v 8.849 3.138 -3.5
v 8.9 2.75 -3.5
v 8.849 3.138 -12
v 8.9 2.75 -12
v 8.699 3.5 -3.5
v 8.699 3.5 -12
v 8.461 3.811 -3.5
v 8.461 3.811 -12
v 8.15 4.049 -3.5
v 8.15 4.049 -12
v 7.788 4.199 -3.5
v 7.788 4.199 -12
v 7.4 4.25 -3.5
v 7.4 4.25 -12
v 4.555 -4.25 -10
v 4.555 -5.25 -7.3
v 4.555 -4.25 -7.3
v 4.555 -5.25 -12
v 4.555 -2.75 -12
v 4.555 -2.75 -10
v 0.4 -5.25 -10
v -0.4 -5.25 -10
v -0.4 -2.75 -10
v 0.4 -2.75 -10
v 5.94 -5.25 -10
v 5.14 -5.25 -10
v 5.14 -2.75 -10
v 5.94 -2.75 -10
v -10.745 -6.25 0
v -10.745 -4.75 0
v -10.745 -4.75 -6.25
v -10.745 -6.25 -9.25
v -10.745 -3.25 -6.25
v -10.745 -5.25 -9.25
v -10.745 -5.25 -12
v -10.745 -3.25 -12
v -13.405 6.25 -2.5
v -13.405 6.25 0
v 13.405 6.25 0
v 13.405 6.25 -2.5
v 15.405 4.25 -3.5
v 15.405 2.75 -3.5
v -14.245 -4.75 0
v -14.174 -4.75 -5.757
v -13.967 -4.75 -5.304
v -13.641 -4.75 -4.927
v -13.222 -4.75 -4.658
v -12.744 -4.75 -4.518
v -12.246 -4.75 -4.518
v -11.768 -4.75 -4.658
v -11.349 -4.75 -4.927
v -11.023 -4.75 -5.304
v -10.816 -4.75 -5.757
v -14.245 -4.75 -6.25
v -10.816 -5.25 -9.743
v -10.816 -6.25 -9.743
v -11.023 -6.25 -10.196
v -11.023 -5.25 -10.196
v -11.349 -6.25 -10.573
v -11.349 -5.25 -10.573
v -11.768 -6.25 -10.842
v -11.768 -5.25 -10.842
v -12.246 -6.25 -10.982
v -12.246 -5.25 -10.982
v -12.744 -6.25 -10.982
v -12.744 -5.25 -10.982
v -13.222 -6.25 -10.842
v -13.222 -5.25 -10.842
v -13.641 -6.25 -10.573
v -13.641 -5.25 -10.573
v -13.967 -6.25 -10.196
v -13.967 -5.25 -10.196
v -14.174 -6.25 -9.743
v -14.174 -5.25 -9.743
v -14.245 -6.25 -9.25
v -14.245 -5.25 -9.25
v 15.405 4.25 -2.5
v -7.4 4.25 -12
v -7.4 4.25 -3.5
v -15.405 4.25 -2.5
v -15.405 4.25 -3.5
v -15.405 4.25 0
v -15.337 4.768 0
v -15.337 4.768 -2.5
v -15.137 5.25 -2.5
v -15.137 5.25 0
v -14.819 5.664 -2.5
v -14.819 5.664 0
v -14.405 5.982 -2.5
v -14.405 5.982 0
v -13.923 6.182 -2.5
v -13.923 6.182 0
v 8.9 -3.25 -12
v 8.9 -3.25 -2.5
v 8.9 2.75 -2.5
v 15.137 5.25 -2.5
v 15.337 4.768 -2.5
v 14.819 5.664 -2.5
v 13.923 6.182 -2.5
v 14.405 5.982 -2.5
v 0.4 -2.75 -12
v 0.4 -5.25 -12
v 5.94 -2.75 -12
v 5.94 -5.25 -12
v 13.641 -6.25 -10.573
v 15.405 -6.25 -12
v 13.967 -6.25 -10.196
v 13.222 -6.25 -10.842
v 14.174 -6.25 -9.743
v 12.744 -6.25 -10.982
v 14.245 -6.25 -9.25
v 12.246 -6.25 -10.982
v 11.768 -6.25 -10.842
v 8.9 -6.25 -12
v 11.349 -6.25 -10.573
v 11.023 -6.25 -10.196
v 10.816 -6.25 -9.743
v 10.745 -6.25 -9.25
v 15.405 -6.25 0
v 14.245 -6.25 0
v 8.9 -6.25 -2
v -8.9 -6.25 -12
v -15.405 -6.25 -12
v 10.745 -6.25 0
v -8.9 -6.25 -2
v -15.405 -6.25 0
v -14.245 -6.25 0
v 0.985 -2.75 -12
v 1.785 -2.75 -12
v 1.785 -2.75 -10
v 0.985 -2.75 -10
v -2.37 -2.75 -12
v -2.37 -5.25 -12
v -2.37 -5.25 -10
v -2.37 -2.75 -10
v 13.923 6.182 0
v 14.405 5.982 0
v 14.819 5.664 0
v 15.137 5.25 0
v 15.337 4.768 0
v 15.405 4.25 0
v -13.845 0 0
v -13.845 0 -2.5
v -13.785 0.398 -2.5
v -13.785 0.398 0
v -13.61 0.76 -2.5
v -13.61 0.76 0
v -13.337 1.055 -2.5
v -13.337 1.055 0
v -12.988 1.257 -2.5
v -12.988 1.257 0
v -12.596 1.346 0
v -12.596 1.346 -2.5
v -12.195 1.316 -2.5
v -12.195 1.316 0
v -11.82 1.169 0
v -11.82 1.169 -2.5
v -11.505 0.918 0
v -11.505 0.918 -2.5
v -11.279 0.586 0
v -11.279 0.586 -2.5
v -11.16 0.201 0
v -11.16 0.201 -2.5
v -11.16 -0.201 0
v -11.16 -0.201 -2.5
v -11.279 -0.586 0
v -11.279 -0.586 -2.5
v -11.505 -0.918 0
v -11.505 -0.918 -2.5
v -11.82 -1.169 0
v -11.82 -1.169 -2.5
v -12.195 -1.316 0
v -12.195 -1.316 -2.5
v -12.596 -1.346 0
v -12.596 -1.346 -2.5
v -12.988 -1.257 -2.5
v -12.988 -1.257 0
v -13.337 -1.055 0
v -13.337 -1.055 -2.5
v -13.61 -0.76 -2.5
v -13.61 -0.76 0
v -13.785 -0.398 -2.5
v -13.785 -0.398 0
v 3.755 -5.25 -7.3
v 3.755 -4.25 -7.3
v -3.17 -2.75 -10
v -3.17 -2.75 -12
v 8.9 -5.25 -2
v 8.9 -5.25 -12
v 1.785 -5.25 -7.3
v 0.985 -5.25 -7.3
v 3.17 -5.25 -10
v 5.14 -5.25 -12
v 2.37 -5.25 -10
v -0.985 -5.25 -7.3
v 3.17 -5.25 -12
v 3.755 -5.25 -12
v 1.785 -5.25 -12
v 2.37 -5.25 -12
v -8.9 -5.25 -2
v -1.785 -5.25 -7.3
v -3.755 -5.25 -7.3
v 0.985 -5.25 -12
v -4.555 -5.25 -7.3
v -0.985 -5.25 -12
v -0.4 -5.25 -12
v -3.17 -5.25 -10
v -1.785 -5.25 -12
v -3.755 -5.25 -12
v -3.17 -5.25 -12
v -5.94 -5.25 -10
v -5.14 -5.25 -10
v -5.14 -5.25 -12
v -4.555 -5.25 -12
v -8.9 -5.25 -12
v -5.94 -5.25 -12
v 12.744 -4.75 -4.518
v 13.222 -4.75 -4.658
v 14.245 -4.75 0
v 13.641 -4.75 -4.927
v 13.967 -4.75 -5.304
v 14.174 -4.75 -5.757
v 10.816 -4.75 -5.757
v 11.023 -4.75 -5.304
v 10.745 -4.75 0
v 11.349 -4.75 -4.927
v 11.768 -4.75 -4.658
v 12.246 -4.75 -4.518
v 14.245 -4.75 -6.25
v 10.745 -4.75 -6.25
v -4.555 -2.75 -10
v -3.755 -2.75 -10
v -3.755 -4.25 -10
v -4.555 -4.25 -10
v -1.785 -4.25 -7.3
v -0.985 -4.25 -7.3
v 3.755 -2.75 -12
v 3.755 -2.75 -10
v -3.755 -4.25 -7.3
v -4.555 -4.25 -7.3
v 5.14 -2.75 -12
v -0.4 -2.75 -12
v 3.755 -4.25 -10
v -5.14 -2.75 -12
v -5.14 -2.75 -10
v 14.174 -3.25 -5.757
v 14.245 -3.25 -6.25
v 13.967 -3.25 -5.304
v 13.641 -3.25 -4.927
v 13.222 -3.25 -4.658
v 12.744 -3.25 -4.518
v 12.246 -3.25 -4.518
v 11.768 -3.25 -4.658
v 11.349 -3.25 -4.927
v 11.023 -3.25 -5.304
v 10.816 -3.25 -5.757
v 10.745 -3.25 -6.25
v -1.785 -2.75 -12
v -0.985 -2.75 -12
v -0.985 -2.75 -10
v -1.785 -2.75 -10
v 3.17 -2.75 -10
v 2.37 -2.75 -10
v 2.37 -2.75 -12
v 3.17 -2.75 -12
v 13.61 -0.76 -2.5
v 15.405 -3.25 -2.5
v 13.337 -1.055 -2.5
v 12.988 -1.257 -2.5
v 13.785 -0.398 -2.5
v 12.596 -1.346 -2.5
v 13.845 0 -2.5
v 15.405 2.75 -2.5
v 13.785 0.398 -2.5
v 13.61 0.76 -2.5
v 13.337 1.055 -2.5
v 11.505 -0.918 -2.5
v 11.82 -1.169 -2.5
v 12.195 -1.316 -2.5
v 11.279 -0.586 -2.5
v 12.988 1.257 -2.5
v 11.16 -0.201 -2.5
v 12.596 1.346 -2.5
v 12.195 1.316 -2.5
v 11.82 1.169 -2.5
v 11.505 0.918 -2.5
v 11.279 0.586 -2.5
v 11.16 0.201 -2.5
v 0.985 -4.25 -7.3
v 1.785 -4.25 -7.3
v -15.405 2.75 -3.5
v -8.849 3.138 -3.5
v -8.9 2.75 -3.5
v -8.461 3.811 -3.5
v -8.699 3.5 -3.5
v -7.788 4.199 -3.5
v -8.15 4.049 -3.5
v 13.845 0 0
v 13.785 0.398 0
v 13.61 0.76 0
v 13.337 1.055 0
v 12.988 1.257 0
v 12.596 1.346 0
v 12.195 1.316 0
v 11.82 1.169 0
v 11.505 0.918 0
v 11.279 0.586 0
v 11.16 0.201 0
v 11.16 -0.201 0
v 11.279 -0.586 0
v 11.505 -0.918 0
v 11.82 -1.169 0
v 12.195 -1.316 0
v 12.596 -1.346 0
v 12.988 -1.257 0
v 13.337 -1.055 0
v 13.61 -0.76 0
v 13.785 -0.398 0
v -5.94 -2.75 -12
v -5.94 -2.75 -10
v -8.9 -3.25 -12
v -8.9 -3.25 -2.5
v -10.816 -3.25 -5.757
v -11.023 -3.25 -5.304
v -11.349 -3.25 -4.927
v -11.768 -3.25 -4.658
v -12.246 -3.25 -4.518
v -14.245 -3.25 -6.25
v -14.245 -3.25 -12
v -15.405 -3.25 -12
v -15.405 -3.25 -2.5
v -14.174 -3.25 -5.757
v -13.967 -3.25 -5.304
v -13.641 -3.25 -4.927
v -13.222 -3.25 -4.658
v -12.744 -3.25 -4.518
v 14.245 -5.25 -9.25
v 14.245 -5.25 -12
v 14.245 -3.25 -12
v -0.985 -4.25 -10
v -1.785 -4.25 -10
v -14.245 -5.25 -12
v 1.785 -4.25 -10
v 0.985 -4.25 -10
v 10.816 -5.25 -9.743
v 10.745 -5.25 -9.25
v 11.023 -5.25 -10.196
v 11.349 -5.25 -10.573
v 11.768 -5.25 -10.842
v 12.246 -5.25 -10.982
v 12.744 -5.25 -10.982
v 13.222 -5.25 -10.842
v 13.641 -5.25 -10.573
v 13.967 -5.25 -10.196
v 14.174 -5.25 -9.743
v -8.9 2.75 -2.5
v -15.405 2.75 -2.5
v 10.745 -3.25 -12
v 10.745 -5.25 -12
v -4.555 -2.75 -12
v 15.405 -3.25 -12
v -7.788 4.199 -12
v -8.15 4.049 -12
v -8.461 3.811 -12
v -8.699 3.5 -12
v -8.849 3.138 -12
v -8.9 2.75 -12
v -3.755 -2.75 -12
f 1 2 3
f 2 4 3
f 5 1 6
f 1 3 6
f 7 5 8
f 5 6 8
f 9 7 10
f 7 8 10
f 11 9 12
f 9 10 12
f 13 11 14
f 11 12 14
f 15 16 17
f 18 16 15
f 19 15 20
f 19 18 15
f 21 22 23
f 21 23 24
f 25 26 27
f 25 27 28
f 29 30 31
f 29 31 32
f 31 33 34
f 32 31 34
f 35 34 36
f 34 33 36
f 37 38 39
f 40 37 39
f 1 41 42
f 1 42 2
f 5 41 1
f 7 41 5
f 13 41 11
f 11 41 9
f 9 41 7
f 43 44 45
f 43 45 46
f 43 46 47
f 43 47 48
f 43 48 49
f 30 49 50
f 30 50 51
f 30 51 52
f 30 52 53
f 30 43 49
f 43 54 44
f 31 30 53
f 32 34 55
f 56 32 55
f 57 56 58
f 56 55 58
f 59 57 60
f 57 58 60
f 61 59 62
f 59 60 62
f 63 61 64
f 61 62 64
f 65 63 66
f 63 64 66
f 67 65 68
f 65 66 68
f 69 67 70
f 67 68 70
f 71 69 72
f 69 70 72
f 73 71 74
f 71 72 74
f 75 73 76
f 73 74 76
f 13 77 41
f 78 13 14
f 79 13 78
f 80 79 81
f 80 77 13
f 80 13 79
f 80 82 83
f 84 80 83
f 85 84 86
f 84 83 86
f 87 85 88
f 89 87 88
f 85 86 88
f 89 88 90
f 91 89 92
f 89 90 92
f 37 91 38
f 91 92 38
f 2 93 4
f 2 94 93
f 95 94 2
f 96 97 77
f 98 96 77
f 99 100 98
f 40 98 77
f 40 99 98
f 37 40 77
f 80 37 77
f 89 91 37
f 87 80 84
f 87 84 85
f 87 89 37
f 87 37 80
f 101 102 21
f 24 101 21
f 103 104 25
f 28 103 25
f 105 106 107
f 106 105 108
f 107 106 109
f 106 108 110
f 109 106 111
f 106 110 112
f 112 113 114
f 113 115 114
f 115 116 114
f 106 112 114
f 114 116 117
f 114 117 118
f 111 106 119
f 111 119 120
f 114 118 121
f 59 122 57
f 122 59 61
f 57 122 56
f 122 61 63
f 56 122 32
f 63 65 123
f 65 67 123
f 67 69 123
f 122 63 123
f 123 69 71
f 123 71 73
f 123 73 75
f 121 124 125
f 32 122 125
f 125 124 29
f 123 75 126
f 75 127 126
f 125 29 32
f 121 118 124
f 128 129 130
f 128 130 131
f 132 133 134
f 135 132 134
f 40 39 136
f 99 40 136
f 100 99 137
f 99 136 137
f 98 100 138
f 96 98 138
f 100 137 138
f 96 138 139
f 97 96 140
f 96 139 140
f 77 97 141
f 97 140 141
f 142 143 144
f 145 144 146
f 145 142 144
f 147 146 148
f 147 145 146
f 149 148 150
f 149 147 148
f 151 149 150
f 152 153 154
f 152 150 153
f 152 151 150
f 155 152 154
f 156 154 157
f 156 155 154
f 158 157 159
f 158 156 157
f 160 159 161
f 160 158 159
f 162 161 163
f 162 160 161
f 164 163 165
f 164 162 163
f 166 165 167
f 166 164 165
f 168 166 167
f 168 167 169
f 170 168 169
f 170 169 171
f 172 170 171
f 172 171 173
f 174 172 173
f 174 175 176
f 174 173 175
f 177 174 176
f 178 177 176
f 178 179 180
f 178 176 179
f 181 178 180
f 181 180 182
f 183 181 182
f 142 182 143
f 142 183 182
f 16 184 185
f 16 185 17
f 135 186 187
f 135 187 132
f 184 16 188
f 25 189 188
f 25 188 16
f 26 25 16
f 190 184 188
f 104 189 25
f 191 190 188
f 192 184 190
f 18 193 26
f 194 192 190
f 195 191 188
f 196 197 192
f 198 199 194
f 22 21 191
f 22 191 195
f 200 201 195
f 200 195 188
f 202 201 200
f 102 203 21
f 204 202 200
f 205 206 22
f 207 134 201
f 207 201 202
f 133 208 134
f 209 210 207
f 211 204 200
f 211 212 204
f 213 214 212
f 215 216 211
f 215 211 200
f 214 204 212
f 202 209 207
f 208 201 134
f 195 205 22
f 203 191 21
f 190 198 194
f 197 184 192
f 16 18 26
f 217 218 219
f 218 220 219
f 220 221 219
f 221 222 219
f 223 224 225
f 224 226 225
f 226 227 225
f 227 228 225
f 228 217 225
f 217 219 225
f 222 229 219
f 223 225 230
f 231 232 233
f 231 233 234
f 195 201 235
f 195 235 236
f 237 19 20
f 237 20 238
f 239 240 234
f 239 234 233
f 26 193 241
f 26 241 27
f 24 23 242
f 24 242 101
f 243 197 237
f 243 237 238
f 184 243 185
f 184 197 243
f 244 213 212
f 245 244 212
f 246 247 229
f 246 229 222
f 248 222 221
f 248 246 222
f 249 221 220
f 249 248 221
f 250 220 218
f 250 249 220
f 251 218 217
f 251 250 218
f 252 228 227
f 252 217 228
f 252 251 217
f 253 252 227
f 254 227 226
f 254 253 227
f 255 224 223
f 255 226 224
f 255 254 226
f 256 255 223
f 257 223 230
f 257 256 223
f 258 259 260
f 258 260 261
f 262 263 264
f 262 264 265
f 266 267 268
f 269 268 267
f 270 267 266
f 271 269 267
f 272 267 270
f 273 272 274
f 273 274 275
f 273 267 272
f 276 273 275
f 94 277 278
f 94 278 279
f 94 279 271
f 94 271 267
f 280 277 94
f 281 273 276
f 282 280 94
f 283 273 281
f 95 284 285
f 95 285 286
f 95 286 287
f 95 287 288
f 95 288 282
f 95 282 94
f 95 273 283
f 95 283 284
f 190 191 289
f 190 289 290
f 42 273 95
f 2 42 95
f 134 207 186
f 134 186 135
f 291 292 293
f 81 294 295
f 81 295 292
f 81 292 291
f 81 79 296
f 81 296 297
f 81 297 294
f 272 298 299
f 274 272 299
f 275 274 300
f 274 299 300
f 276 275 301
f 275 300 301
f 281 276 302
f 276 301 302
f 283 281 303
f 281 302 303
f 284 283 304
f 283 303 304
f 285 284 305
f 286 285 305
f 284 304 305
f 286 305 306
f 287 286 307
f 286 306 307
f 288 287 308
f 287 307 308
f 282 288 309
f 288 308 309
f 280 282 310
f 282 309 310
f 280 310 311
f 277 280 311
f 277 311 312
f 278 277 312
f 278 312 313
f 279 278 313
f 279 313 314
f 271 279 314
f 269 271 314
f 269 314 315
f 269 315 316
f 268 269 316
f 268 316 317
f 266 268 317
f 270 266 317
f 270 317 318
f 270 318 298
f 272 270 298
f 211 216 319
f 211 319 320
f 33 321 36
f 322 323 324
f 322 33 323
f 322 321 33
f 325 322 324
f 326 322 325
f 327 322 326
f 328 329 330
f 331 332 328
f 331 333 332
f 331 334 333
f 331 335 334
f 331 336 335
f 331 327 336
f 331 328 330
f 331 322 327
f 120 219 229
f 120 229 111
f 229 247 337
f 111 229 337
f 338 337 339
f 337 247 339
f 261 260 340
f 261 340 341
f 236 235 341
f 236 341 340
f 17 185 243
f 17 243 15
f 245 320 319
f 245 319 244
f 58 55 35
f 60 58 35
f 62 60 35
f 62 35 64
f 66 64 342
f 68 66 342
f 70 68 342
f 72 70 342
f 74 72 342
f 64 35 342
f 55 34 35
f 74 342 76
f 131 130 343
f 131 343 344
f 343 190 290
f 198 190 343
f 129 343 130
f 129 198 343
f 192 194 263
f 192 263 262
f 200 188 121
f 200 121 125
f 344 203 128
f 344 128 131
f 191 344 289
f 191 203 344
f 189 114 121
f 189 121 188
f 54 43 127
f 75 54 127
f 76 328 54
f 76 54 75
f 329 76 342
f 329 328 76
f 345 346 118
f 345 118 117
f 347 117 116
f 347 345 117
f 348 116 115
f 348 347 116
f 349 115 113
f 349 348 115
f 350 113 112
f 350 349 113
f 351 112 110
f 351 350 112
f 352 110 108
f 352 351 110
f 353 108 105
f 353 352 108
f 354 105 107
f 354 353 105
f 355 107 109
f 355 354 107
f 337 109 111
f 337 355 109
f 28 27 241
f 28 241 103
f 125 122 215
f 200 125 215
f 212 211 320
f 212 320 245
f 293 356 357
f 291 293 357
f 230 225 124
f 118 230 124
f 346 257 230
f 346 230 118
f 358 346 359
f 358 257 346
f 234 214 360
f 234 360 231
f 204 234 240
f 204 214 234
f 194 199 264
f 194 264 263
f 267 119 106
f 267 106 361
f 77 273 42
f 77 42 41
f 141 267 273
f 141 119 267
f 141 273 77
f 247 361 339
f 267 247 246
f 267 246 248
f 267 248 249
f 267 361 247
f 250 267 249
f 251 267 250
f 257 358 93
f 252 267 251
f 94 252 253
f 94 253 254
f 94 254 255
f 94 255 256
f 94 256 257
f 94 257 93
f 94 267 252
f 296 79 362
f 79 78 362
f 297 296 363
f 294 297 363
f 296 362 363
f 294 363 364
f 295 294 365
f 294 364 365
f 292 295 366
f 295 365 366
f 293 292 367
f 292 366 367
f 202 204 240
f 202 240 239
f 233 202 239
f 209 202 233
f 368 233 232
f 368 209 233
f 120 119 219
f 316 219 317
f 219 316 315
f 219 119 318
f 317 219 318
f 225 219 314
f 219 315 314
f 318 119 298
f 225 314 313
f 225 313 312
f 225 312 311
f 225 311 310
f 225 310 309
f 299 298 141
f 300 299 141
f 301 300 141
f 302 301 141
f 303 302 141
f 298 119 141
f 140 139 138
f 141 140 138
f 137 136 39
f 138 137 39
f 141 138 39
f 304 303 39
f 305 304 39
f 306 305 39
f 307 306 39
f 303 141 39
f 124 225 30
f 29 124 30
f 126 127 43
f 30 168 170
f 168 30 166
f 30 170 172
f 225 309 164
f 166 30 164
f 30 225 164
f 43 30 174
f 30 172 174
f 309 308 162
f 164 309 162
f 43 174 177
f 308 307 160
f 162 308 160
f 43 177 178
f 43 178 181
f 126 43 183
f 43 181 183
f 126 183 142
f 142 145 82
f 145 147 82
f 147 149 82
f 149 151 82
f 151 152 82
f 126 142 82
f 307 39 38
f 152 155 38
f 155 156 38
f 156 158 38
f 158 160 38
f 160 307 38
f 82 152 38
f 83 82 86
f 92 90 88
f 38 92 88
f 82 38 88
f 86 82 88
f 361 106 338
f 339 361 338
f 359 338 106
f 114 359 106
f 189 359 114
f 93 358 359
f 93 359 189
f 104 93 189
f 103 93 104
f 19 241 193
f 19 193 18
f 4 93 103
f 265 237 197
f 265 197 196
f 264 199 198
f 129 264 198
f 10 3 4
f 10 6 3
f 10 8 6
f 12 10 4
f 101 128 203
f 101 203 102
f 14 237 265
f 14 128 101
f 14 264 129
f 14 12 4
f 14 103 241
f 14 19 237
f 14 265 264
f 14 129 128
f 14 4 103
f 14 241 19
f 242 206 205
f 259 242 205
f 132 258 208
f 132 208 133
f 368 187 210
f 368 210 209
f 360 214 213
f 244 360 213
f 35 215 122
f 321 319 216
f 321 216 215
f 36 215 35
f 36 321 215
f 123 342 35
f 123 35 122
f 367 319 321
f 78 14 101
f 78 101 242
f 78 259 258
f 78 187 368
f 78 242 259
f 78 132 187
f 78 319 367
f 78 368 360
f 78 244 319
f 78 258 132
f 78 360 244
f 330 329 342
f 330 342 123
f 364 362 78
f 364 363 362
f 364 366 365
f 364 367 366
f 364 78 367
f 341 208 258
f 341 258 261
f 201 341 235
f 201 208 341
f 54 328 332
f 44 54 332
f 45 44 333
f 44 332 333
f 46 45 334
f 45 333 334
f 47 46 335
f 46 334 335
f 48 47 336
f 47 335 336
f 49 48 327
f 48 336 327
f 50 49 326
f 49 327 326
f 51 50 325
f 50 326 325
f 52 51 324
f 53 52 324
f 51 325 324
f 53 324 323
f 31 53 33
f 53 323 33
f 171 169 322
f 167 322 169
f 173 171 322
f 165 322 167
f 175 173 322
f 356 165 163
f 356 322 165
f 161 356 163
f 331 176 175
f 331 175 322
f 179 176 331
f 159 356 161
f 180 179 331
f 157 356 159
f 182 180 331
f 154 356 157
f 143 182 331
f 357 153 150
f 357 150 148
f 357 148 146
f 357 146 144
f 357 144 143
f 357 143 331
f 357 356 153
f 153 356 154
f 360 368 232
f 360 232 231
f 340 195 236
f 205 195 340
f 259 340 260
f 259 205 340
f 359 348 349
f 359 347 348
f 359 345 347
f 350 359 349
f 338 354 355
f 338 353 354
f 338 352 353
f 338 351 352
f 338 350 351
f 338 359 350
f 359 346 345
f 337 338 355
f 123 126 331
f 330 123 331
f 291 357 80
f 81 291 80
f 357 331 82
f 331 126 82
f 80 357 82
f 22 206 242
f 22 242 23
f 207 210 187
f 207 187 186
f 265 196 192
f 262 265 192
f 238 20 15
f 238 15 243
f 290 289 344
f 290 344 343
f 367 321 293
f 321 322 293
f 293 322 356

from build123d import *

# Parameters (mm, degrees)
RESSALTO_EXTRUS_O1_DEPTH = 2.5
ESBO_O2_W                = 30.81
ESBO_O2_H                = 3
RESSALTO_EXTRUS_O2_DEPTH = 9.5
ESBO_O3_W                = 17.8
ESBO_O3_H                = 1
CORTE_EXTRUS_O1_DEPTH    = 10
ESBO_O4_W                = 30.81
ESBO_O4_H                = 1.5
RESSALTO_EXTRUS_O3_DEPTH = 1
ESBO_O5_W                = 17.8
ESBO_O5_H                = 9.5
RESSALTO_EXTRUS_O4_DEPTH = 9.5
FILETE1_R                = 1.5
CORTE_EXTRUS_O2_DEPTH    = 22.715524976
ESBO_O7_W                = 3.5
ESBO_O7_H                = 4.25
CORTE_EXTRUS_O3_DEPTH    = 2
ESBO_O8_W                = 3.5
ESBO_O8_H                = 6.727306506
CORTE_EXTRUS_O4_DEPTH    = 1.5
ESBO_O9_R                = 1.35
CORTE_EXTRUS_O5_DEPTH    = 21.503085743
ESBO_O10_W               = 0.8
ESBO_O10_H               = 2
CORTE_EXTRUS_O6_DEPTH    = 2.5
PADR_O_LINEAR1_COUNT     = 3
PADR_O_LINEAR1_PITCH     = 2.77
PADR_O_LINEAR1_COL_COUNT = 3
PADR_O_LINEAR1_COL_PITCH = 2.77
ESBO_O11_W               = 0.8
ESBO_O11_H               = 4.7
CORTE_EXTRUS_O7_DEPTH    = 1
ESBO_O12_W               = 0.8
ESBO_O12_H               = 1.5
CORTE_EXTRUS_O8_DEPTH    = 2
PADR_O_LINEAR2_COUNT     = 4
PADR_O_LINEAR2_PITCH     = 2.77


with BuildPart() as part:
    # Esboço1 → Ressalto-extrusão1 (new body)
    with BuildSketch(Plane.XY):
        with BuildLine():
            Line((-13.405, 6.25), (13.405, 6.25))
            ThreePointArc((13.405, 6.25), (14.819213562, 5.664213562), (15.405, 4.25))
            Line((15.405, 4.25), (15.405, -6.25))
            Line((15.405, -6.25), (-15.405, -6.25))
            Line((-15.405, -6.25), (-15.405, 4.25))
            ThreePointArc((-15.405, 4.25), (-14.819213562, 5.664213562), (-13.405, 6.25))
        make_face()
    extrude(amount=-RESSALTO_EXTRUS_O1_DEPTH)

    # Esboço2 → Ressalto-extrusão2 (add)
    with BuildSketch(Plane(origin=(0, 0, -2.5), x_dir=(-1, 0, 0), z_dir=(0, 0, -1))):
        with Locations((0, -4.75)):
            Rectangle(ESBO_O2_W, ESBO_O2_H)
    extrude(amount=RESSALTO_EXTRUS_O2_DEPTH)

    # Esboço3 → Corte-extrusão1 (cut)
    with BuildSketch(Plane(origin=(0, 0, -12), x_dir=(-1, 0, 0), z_dir=(0, 0, -1))):
        with Locations((0, -5.75)):
            Rectangle(ESBO_O3_W, ESBO_O3_H)
    extrude(amount=-CORTE_EXTRUS_O1_DEPTH, mode=Mode.SUBTRACT)

    # Esboço4 → Ressalto-extrusão3 (add)
    with BuildSketch(Plane(origin=(0, 0, -2.5), x_dir=(-1, 0, 0), z_dir=(0, 0, -1))):
        with Locations((0, 3.5)):
            Rectangle(ESBO_O4_W, ESBO_O4_H)
    extrude(amount=RESSALTO_EXTRUS_O3_DEPTH)

    # Esboço5 → Ressalto-extrusão4 (add)
    with BuildSketch(Plane(origin=(0, 0, -2.5), x_dir=(-1, 0, 0), z_dir=(0, 0, -1))):
        with Locations((0, -0.5)):
            Rectangle(ESBO_O5_W, ESBO_O5_H)
    extrude(amount=RESSALTO_EXTRUS_O4_DEPTH)

    # Filete1
    filete1_edges = [part.edges().sort_by_distance(p)[0] for p in [
        (8.9, 4.25, -7.75),
        (-8.9, 4.25, -7.75),
    ]]
    fillet(filete1_edges, radius=FILETE1_R)

    # Esboço6 → Corte-extrusão2 (cut, through all)
    with BuildSketch(Plane(origin=(0, -3.25, 0), x_dir=(1, 0, 0), z_dir=(0, 1, 0))):
        with BuildLine():
            Line((10.745, 6.25), (10.745, 9.25))
            ThreePointArc((10.745, 9.25), (12.495, 11), (14.245, 9.25))
            Line((14.245, 9.25), (14.245, 6.25))
            ThreePointArc((14.245, 6.25), (12.495, 4.5), (10.745, 6.25))
        make_face()
    corte_extrus_o2 = extrude(amount=-CORTE_EXTRUS_O2_DEPTH, mode=Mode.SUBTRACT)

    # Espelhar1: Corte-extrusão2 across plane
    add(corte_extrus_o2.mirror(Plane(origin=(0, 0, 0), x_dir=(0, 0, 1), z_dir=(1, 0, 0))), mode=Mode.SUBTRACT)

    # Esboço7 → Corte-extrusão3 (cut)
    with BuildSketch(Plane(origin=(0, -3.25, 0), x_dir=(1, 0, 0), z_dir=(0, 1, 0))):
        with Locations((12.495, 9.875)):
            Rectangle(ESBO_O7_W, ESBO_O7_H)
    corte_extrus_o3 = extrude(amount=-CORTE_EXTRUS_O3_DEPTH, mode=Mode.SUBTRACT)

    # Espelhar2: Corte-extrusão3 across plane
    add(corte_extrus_o3.mirror(Plane(origin=(0, 0, 0), x_dir=(0, 0, 1), z_dir=(1, 0, 0))), mode=Mode.SUBTRACT)

    # Esboço8 → Corte-extrusão4 (cut)
    with BuildSketch(Plane.XZ.offset(6.25)):
        with Locations((-12.495, -3.363653253)):
            Rectangle(ESBO_O8_W, ESBO_O8_H)
    corte_extrus_o4 = extrude(amount=-CORTE_EXTRUS_O4_DEPTH, mode=Mode.SUBTRACT)

    # Espelhar3: Corte-extrusão3, Corte-extrusão4 across plane
    add(corte_extrus_o3.mirror(Plane(origin=(0, 0, 0), x_dir=(0, 0, 1), z_dir=(1, 0, 0))), mode=Mode.SUBTRACT)
    add(corte_extrus_o4.mirror(Plane(origin=(0, 0, 0), x_dir=(0, 0, 1), z_dir=(1, 0, 0))), mode=Mode.SUBTRACT)

    # Esboço9 → Corte-extrusão5 (cut, through all)
    with BuildSketch(Plane.XY):
        with Locations((12.495, 0)):
            Circle(ESBO_O9_R)
    corte_extrus_o5 = extrude(amount=-CORTE_EXTRUS_O5_DEPTH, mode=Mode.SUBTRACT)

    # Espelhar4: Corte-extrusão5 across plane
    add(corte_extrus_o5.mirror(Plane(origin=(0, 0, 0), x_dir=(0, 0, 1), z_dir=(1, 0, 0))), mode=Mode.SUBTRACT)

    # Esboço10 → Corte-extrusão6 (cut)
    with BuildSketch(Plane.XZ.offset(5.25)):
        with Locations((0, -11)):
            Rectangle(ESBO_O10_W, ESBO_O10_H)
    corte_extrus_o6 = extrude(amount=-CORTE_EXTRUS_O6_DEPTH, mode=Mode.SUBTRACT)

    # Padrão linear1: Corte-extrusão6 ×3
    with Locations(*[(-i * PADR_O_LINEAR1_PITCH, 0, 0) for i in range(1, PADR_O_LINEAR1_COUNT)]):
        add(corte_extrus_o6, mode=Mode.SUBTRACT)

    # Padrão linear1 col: Corte-extrusão6 ×3
    with Locations(*[(i * PADR_O_LINEAR1_COL_PITCH, 0, 0) for i in range(1, PADR_O_LINEAR1_COL_COUNT)]):
        add(corte_extrus_o6, mode=Mode.SUBTRACT)

    # Esboço11 → Corte-extrusão7 (cut)
    with BuildSketch(Plane.XZ.offset(5.25)):
        with Locations((4.155, -9.65)):
            Rectangle(ESBO_O11_W, ESBO_O11_H)
    corte_extrus_o7 = extrude(amount=-CORTE_EXTRUS_O7_DEPTH, mode=Mode.SUBTRACT)

    # Esboço12 → Corte-extrusão8 (cut)
    with BuildSketch(Plane(origin=(0, 0, -12), x_dir=(-1, 0, 0), z_dir=(0, 0, -1))):
        with Locations((-4.155, -3.5)):
            Rectangle(ESBO_O12_W, ESBO_O12_H)
    corte_extrus_o8 = extrude(amount=-CORTE_EXTRUS_O8_DEPTH, mode=Mode.SUBTRACT)

    # Padrão linear2: Corte-extrusão7, Corte-extrusão8 ×4
    with Locations(*[(-i * PADR_O_LINEAR2_PITCH, 0, 0) for i in range(1, PADR_O_LINEAR2_COUNT)]):
        add(corte_extrus_o7, mode=Mode.SUBTRACT)
        add(corte_extrus_o8, mode=Mode.SUBTRACT)


solid = part.part
